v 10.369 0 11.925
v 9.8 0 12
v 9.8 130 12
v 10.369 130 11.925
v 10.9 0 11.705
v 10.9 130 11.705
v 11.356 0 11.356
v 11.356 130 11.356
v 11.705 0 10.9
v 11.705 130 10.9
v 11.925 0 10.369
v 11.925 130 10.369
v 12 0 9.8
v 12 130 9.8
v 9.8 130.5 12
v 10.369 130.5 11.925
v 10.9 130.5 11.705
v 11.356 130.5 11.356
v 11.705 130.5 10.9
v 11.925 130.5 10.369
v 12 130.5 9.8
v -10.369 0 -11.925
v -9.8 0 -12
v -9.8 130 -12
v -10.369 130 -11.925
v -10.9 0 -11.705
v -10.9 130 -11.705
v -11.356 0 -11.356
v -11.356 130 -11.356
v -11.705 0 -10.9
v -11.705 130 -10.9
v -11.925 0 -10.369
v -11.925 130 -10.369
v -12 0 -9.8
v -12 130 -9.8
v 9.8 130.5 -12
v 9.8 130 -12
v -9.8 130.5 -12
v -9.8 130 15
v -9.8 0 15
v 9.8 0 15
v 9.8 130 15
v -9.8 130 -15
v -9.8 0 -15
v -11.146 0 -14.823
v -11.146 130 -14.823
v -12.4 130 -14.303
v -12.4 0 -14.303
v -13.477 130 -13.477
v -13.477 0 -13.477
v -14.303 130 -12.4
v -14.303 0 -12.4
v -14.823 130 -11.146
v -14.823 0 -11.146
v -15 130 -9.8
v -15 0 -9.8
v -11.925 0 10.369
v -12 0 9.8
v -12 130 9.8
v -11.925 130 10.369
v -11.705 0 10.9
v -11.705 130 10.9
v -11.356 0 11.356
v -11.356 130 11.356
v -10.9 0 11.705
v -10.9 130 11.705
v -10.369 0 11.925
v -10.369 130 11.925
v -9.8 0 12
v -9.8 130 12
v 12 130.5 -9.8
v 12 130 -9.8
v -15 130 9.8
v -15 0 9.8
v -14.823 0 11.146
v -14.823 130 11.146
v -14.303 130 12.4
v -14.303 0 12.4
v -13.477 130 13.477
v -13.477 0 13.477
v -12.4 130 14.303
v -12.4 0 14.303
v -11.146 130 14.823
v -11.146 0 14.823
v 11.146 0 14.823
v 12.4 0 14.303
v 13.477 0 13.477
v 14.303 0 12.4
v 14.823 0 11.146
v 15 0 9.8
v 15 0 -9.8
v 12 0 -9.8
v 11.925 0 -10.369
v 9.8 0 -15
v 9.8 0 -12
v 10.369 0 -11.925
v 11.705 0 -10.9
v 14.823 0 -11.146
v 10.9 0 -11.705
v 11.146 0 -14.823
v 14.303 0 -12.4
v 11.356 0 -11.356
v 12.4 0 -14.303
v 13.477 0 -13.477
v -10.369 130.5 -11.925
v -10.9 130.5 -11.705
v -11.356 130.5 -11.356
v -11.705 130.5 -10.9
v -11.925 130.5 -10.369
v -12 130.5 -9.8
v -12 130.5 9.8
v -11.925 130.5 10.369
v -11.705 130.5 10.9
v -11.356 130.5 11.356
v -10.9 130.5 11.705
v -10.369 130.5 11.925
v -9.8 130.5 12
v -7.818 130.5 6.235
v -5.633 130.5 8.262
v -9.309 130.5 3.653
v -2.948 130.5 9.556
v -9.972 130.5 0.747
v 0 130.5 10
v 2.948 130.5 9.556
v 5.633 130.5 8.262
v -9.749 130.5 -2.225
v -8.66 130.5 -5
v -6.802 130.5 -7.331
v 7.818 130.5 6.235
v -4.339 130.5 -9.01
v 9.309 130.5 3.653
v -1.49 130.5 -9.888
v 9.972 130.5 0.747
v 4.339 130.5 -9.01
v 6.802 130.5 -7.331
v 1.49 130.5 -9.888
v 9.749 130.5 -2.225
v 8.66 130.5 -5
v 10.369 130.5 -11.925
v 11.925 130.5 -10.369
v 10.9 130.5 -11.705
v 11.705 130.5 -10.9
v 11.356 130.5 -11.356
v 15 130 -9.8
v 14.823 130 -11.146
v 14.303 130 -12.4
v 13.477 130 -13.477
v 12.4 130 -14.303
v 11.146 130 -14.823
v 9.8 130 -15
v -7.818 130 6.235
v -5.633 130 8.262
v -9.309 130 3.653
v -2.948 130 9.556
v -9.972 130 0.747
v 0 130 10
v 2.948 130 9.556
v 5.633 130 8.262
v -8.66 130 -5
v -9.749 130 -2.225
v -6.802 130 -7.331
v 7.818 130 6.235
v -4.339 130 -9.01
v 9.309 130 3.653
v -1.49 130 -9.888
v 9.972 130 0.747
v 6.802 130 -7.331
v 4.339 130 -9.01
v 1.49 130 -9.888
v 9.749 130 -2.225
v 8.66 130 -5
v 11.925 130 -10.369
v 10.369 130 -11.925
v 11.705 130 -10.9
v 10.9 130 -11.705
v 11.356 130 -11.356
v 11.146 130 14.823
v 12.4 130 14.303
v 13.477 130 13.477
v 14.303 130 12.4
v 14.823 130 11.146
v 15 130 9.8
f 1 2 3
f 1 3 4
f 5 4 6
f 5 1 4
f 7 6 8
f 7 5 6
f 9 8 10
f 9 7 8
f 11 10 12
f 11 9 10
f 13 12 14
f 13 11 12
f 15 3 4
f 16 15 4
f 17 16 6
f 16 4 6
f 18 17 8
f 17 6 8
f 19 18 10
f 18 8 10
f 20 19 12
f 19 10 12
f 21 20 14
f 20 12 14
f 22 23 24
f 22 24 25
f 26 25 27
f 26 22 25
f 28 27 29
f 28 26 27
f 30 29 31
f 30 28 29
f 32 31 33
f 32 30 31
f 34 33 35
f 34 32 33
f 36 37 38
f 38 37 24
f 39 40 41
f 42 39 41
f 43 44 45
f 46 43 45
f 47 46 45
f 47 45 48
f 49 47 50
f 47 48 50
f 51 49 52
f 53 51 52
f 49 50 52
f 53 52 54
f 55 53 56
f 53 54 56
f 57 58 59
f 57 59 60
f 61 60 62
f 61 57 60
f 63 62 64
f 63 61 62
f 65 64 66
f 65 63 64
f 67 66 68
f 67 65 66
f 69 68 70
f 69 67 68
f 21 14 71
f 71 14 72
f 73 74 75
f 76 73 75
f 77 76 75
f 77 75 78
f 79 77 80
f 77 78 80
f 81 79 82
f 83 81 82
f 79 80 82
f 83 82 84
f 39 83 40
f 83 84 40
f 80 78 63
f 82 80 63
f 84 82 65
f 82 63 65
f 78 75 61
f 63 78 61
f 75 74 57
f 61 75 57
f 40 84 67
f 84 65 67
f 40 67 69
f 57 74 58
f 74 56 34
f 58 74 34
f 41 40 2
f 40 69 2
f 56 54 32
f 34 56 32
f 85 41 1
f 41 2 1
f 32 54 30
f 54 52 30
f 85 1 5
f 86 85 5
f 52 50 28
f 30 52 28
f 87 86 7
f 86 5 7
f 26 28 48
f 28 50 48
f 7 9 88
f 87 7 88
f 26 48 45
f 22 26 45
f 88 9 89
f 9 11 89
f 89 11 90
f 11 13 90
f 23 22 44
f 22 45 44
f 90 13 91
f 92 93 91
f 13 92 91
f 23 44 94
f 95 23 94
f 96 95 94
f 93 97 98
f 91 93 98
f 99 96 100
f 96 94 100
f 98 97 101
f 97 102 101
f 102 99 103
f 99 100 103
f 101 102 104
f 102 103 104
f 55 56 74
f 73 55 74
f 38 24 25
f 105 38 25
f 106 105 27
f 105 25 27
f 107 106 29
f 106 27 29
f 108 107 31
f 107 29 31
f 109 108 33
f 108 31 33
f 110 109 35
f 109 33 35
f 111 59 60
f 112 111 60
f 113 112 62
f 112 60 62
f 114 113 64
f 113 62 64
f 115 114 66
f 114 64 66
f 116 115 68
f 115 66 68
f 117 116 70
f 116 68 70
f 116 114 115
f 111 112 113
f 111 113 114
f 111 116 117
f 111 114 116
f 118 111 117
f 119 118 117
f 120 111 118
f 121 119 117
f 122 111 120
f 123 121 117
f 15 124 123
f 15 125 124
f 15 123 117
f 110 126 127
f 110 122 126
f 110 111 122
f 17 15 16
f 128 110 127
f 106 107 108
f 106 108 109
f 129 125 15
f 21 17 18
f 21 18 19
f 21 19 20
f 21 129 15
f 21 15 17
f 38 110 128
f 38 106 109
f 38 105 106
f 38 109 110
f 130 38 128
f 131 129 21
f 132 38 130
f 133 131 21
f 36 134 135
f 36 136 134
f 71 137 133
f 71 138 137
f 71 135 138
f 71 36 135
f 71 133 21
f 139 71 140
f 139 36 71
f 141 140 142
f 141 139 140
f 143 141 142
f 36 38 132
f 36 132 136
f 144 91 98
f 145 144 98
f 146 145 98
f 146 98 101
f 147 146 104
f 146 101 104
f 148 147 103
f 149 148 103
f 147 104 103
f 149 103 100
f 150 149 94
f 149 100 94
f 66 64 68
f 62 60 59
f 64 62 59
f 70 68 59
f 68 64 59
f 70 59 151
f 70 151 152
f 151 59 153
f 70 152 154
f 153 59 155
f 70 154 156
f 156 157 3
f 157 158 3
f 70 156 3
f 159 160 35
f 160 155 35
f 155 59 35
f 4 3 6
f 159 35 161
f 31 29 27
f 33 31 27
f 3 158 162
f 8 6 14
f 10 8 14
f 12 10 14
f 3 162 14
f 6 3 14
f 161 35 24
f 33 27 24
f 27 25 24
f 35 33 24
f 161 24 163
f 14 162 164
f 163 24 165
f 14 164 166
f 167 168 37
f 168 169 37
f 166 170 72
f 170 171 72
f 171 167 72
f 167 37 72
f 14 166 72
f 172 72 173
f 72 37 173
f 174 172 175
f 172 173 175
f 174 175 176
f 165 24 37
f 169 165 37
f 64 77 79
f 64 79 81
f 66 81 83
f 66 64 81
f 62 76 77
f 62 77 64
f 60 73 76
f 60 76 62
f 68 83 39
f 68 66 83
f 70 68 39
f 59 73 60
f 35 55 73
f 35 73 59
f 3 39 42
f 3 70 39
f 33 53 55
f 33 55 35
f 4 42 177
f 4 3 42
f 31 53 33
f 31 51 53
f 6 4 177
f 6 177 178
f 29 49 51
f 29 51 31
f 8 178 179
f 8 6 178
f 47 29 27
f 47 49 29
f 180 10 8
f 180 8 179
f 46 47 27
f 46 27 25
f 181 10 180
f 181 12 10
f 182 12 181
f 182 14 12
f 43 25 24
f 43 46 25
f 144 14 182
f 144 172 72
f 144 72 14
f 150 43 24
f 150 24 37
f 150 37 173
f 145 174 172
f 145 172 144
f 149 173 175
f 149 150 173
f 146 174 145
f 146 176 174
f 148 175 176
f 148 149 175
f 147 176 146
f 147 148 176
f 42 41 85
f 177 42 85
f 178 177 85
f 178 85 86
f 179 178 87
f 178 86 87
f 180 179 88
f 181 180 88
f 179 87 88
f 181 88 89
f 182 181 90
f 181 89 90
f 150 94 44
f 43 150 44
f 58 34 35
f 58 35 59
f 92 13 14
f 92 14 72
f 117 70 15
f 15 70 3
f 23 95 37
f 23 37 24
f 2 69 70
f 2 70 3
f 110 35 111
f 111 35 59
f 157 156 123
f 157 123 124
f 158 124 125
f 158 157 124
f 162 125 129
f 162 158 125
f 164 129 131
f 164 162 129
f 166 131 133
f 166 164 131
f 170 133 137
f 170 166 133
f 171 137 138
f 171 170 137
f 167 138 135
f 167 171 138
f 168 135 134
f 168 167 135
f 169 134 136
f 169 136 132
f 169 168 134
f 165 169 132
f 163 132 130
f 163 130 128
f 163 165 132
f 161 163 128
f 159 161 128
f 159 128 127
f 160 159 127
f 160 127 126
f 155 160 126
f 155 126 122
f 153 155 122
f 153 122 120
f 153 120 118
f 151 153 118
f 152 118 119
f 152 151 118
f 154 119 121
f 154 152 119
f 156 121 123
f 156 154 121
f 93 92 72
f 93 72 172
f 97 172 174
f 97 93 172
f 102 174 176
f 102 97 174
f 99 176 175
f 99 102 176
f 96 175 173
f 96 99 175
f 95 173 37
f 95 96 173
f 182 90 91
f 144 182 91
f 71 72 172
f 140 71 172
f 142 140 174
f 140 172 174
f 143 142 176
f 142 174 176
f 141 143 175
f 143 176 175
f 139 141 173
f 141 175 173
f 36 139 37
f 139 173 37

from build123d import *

# Parameters (mm, degrees)
SQUARE_TUBE_30_X_30_X_2_6_1_DEPTH = 130
SKETCH13_R                        = 10
BOSS_EXTRUDE1_DEPTH               = 0.5


with BuildPart() as part:
    # Sketch12 → Square tube 30 X 30 X 2.6(1) (new body)
    with BuildSketch(Plane(origin=(0, 0, 0), x_dir=(1, 0, 0), z_dir=(0, 1, 0))):
        with BuildLine():
            Line((-9.8, -15), (9.8, -15))
            ThreePointArc((9.8, -15), (13.476955262, -13.476955262), (15, -9.8))
            Line((15, -9.8), (15, 9.8))
            ThreePointArc((15, 9.8), (13.476955262, 13.476955262), (9.8, 15))
            Line((9.8, 15), (-9.8, 15))
            ThreePointArc((-9.8, 15), (-13.476955262, 13.476955262), (-15, 9.8))
            Line((-15, 9.8), (-15, -9.8))
            ThreePointArc((-15, -9.8), (-13.476955262, -13.476955262), (-9.8, -15))
        make_face()
        with BuildLine():
            Line((-9.8, -12), (9.8, -12))
            ThreePointArc((9.8, -12), (11.355634919, -11.355634919), (12, -9.8))
            Line((12, -9.8), (12, 9.8))
            ThreePointArc((12, 9.8), (11.355634919, 11.355634919), (9.8, 12))
            Line((9.8, 12), (-9.8, 12))
            ThreePointArc((-9.8, 12), (-11.355634919, 11.355634919), (-12, 9.8))
            Line((-12, 9.8), (-12, -9.8))
            ThreePointArc((-12, -9.8), (-11.355634919, -11.355634919), (-9.8, -12))
        make_face(mode=Mode.SUBTRACT)
    extrude(amount=SQUARE_TUBE_30_X_30_X_2_6_1_DEPTH)


with BuildPart() as body_2:
    # Sketch13 → Boss-Extrude1 (new body)
    with BuildSketch(Plane(origin=(0, 130, 0), x_dir=(1, 0, 0), z_dir=(0, 1, 0))):
        with BuildLine():
            Line((12, -9.8), (12, 9.8))
            ThreePointArc((12, 9.8), (11.355634919, 11.355634919), (9.8, 12))
            Line((9.8, 12), (-9.8, 12))
            ThreePointArc((-9.8, 12), (-11.355634919, 11.355634919), (-12, 9.8))
            Line((-12, 9.8), (-12, -9.8))
            ThreePointArc((-12, -9.8), (-11.355634919, -11.355634919), (-9.8, -12))
            Line((-9.8, -12), (9.8, -12))
            ThreePointArc((9.8, -12), (11.355634919, -11.355634919), (12, -9.8))
        make_face()
        with Locations(Location((0, 0, 0), (0, 0, 270))):
            Circle(SKETCH13_R, mode=Mode.SUBTRACT)
    extrude(amount=BOSS_EXTRUDE1_DEPTH)


solid = Compound([part.part, body_2.part])
